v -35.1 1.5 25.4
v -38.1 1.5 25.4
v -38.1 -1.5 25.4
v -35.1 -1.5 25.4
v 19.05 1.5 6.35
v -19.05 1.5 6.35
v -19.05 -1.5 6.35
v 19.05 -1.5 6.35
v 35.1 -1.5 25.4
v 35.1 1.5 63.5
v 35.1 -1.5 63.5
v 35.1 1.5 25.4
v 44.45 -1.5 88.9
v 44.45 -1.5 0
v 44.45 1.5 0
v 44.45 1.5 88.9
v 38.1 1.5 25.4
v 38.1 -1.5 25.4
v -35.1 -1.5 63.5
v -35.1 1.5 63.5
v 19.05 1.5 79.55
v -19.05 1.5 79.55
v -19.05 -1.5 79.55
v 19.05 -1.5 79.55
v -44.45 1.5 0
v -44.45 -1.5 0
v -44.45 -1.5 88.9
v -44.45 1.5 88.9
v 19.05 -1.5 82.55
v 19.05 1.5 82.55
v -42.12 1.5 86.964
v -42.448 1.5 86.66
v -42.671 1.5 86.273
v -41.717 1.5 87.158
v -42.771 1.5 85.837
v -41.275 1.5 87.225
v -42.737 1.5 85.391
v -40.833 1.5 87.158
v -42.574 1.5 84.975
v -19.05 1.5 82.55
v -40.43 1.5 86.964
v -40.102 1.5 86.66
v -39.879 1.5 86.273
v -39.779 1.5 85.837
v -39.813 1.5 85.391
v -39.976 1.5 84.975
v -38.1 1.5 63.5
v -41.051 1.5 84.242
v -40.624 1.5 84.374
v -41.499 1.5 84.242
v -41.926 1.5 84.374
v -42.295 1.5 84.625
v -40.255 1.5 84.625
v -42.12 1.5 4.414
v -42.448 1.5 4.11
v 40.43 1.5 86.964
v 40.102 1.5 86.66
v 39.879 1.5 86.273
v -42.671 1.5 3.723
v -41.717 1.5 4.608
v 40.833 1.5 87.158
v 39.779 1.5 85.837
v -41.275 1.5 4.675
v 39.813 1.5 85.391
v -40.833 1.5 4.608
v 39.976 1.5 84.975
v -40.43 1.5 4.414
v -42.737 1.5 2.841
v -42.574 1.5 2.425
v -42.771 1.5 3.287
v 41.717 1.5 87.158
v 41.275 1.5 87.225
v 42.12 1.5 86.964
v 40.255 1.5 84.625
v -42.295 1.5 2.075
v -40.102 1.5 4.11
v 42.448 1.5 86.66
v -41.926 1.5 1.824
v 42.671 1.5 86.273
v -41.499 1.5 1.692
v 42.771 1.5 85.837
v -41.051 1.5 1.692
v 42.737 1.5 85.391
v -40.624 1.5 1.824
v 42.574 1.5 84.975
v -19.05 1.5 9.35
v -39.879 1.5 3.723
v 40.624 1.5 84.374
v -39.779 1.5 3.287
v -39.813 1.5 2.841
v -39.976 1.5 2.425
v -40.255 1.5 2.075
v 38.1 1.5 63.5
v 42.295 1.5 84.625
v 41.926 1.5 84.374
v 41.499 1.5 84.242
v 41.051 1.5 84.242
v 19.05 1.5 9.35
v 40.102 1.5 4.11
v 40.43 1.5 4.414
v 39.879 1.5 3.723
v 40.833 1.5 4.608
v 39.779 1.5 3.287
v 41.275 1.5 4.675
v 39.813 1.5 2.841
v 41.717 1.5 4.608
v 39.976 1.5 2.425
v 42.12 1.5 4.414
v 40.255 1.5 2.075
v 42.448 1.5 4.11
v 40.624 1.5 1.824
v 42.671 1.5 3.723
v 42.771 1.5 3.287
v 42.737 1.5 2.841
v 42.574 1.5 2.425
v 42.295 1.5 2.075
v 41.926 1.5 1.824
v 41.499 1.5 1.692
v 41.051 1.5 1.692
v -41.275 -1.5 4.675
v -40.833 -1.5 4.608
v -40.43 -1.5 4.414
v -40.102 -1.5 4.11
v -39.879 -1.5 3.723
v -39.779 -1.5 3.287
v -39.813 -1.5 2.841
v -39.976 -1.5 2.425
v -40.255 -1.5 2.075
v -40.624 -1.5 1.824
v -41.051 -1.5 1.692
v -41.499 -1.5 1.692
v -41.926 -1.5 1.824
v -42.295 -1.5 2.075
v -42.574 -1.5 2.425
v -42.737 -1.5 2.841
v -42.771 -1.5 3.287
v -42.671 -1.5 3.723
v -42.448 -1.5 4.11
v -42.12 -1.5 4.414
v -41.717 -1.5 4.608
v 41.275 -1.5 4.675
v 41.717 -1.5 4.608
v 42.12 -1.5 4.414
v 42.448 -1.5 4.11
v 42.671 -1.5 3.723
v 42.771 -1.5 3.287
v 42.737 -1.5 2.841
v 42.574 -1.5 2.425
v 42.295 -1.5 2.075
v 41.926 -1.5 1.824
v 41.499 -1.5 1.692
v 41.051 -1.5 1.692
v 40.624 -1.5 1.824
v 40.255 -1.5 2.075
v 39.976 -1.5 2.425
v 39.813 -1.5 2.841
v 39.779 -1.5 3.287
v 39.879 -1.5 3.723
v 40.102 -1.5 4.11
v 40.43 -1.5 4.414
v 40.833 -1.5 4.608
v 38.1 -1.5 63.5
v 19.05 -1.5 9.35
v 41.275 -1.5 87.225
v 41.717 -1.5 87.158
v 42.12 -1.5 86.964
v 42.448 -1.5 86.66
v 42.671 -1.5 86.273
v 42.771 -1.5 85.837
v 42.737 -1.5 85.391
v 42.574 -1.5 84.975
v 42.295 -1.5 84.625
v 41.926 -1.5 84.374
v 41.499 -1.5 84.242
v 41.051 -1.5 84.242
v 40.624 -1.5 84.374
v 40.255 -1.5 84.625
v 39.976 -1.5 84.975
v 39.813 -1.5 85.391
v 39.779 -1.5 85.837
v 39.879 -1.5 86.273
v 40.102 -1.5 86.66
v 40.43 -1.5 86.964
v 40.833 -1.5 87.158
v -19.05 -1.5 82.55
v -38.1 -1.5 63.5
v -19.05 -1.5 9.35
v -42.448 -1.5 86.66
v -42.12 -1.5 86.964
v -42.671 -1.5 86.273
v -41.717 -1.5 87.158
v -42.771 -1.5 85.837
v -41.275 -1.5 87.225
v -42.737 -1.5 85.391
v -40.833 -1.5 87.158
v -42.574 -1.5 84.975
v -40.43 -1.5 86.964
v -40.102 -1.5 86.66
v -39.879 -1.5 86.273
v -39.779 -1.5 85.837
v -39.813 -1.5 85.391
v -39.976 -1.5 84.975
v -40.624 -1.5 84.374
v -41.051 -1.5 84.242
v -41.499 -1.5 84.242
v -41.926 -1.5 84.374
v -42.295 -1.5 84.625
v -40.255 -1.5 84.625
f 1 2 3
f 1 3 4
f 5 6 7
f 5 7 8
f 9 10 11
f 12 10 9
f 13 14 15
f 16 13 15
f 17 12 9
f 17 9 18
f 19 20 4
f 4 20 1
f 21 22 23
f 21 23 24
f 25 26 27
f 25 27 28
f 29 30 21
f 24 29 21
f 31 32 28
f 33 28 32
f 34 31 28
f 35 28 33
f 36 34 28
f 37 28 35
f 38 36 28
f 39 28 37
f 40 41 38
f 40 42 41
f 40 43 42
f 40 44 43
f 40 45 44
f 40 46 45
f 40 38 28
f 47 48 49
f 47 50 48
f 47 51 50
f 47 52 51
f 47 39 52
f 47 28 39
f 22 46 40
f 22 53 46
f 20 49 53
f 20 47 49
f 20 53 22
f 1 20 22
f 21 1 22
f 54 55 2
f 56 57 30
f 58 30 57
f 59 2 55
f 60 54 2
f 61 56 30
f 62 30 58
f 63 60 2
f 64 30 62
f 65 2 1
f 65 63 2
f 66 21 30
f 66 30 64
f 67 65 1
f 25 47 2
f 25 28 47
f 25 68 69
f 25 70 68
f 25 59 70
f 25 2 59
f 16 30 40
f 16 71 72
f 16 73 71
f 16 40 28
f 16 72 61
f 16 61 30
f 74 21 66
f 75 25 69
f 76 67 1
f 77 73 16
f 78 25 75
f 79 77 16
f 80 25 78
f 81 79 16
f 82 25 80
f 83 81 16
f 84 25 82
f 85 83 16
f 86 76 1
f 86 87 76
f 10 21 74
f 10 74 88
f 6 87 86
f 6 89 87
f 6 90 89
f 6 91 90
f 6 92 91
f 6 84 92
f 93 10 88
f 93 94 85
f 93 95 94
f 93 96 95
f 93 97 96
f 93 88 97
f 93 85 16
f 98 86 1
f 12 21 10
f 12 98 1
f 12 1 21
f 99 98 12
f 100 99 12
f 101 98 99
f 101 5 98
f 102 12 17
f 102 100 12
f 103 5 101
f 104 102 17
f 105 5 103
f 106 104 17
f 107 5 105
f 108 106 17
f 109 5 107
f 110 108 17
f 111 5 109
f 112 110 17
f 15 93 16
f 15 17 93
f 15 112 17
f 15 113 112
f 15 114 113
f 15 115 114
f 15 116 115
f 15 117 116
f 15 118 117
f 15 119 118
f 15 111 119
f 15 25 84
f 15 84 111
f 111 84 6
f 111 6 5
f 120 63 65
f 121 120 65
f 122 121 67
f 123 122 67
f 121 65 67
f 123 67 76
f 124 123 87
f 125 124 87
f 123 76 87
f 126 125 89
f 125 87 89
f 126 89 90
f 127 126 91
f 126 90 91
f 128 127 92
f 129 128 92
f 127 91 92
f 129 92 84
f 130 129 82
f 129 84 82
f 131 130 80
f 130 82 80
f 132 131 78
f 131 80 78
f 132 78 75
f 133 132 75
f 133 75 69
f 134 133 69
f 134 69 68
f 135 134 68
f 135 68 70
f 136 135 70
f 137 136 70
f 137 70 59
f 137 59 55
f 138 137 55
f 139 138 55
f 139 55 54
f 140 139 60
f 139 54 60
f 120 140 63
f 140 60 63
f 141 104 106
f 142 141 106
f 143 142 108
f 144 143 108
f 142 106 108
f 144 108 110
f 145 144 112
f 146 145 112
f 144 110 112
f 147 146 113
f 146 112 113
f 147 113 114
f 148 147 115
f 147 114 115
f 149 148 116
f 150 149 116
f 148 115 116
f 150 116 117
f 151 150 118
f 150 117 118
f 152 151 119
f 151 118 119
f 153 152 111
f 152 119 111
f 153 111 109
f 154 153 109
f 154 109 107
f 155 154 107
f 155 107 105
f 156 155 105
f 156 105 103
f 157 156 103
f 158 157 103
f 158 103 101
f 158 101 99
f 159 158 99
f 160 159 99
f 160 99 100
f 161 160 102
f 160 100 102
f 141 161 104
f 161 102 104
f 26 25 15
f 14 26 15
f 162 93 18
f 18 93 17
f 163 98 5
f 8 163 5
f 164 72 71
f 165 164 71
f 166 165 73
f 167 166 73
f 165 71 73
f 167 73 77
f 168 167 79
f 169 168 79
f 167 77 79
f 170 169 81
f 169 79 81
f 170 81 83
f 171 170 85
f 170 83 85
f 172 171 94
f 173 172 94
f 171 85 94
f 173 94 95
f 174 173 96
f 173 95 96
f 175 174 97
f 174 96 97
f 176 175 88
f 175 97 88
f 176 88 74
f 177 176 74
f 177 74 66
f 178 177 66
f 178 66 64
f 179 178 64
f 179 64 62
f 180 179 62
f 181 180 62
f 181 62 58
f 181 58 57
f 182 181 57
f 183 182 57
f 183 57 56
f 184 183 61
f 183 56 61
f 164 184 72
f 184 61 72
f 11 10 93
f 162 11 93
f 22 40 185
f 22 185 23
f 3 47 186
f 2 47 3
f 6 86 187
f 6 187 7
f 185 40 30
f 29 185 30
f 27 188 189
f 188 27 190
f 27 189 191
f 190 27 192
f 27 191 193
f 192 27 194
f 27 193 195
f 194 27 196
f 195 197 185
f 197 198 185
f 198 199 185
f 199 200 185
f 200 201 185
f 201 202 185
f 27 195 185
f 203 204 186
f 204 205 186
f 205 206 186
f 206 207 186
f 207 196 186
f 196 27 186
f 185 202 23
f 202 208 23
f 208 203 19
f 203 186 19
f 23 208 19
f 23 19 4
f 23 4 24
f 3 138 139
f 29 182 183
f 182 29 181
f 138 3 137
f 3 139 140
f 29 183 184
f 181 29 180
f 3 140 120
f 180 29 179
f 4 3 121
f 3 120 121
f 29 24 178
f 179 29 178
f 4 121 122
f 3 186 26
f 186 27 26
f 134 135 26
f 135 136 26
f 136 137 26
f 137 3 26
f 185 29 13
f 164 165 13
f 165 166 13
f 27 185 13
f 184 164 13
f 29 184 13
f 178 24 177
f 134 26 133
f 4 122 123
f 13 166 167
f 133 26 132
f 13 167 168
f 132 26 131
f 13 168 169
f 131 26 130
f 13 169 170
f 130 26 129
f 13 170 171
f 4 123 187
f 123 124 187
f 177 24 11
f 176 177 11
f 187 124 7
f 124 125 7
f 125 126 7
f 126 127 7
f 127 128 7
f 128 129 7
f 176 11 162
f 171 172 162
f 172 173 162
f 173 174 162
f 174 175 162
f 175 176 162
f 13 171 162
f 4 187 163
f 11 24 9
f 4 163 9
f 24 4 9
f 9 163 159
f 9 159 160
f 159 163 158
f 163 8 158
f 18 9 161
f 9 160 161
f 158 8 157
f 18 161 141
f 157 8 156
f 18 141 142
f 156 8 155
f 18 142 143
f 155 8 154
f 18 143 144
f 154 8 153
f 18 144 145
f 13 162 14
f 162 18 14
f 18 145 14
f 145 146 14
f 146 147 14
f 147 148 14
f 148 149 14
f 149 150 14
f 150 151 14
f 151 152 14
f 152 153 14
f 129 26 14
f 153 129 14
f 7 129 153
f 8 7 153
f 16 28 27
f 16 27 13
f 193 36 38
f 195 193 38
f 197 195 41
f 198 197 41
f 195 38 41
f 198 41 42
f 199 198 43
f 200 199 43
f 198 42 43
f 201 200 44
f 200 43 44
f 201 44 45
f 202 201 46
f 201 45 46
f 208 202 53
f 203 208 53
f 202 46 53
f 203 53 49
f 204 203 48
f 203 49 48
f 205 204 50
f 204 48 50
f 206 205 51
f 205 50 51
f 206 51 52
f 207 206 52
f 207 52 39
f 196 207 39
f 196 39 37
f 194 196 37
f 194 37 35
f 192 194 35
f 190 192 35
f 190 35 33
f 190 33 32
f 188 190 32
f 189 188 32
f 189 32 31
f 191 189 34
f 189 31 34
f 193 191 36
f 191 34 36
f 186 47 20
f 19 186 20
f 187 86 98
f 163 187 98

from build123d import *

# Parameters (mm, degrees)
SKETCH_2_W          = 88.9
SKETCH_2_H          = 3
EXTRUDE_1_DEPTH     = 88.9
SKETCH_4_R          = 1.5
CUT_EXTRUDE_1_DEPTH = 3
SKETCH_10_W         = 3
SKETCH_10_H         = 38.1
SKETCH_10_W_2       = 38.1
SKETCH_10_H_2       = 3
CUT_EXTRUDE_6_DEPTH = 3


with BuildPart() as part:
    # 스케치2 → 보스-돌출1 (new body)
    with BuildSketch(Plane.XY):
        Rectangle(SKETCH_2_W, SKETCH_2_H)
    extrude(amount=EXTRUDE_1_DEPTH)

    # 스케치4 → 컷-돌출1 (cut)
    with BuildSketch(Plane(origin=(0, 1.5, 0), x_dir=(1, 0, 0), z_dir=(0, 1, 0))):
        with Locations(Location((-41.275, -85.725, 0), (0, 0, 270))):
            Circle(SKETCH_4_R)
        with Locations(Location((-41.275, -3.175, 0), (0, 0, 270))):
            Circle(SKETCH_4_R)
        with Locations(Location((41.275, -3.175, 0), (0, 0, 270))):
            Circle(SKETCH_4_R)
        with Locations(Location((41.275, -85.725, 0), (0, 0, 270))):
            Circle(SKETCH_4_R)
    extrude(amount=-CUT_EXTRUDE_1_DEPTH, mode=Mode.SUBTRACT)

    # 스케치10 → 컷-돌출6 (cut)
    with BuildSketch(Plane(origin=(0, 1.5, 0), x_dir=(1, 0, 0), z_dir=(0, 1, 0))):
        with Locations((-36.6, -44.45)):
            Rectangle(SKETCH_10_W, SKETCH_10_H)
        with Locations((0, -7.85)):
            Rectangle(SKETCH_10_W_2, SKETCH_10_H_2)
        with Locations((36.6, -44.45)):
            Rectangle(SKETCH_10_W, SKETCH_10_H)
        with Locations((0, -81.05)):
            Rectangle(SKETCH_10_W_2, SKETCH_10_H_2)
    extrude(amount=-CUT_EXTRUDE_6_DEPTH, mode=Mode.SUBTRACT)


solid = part.part
